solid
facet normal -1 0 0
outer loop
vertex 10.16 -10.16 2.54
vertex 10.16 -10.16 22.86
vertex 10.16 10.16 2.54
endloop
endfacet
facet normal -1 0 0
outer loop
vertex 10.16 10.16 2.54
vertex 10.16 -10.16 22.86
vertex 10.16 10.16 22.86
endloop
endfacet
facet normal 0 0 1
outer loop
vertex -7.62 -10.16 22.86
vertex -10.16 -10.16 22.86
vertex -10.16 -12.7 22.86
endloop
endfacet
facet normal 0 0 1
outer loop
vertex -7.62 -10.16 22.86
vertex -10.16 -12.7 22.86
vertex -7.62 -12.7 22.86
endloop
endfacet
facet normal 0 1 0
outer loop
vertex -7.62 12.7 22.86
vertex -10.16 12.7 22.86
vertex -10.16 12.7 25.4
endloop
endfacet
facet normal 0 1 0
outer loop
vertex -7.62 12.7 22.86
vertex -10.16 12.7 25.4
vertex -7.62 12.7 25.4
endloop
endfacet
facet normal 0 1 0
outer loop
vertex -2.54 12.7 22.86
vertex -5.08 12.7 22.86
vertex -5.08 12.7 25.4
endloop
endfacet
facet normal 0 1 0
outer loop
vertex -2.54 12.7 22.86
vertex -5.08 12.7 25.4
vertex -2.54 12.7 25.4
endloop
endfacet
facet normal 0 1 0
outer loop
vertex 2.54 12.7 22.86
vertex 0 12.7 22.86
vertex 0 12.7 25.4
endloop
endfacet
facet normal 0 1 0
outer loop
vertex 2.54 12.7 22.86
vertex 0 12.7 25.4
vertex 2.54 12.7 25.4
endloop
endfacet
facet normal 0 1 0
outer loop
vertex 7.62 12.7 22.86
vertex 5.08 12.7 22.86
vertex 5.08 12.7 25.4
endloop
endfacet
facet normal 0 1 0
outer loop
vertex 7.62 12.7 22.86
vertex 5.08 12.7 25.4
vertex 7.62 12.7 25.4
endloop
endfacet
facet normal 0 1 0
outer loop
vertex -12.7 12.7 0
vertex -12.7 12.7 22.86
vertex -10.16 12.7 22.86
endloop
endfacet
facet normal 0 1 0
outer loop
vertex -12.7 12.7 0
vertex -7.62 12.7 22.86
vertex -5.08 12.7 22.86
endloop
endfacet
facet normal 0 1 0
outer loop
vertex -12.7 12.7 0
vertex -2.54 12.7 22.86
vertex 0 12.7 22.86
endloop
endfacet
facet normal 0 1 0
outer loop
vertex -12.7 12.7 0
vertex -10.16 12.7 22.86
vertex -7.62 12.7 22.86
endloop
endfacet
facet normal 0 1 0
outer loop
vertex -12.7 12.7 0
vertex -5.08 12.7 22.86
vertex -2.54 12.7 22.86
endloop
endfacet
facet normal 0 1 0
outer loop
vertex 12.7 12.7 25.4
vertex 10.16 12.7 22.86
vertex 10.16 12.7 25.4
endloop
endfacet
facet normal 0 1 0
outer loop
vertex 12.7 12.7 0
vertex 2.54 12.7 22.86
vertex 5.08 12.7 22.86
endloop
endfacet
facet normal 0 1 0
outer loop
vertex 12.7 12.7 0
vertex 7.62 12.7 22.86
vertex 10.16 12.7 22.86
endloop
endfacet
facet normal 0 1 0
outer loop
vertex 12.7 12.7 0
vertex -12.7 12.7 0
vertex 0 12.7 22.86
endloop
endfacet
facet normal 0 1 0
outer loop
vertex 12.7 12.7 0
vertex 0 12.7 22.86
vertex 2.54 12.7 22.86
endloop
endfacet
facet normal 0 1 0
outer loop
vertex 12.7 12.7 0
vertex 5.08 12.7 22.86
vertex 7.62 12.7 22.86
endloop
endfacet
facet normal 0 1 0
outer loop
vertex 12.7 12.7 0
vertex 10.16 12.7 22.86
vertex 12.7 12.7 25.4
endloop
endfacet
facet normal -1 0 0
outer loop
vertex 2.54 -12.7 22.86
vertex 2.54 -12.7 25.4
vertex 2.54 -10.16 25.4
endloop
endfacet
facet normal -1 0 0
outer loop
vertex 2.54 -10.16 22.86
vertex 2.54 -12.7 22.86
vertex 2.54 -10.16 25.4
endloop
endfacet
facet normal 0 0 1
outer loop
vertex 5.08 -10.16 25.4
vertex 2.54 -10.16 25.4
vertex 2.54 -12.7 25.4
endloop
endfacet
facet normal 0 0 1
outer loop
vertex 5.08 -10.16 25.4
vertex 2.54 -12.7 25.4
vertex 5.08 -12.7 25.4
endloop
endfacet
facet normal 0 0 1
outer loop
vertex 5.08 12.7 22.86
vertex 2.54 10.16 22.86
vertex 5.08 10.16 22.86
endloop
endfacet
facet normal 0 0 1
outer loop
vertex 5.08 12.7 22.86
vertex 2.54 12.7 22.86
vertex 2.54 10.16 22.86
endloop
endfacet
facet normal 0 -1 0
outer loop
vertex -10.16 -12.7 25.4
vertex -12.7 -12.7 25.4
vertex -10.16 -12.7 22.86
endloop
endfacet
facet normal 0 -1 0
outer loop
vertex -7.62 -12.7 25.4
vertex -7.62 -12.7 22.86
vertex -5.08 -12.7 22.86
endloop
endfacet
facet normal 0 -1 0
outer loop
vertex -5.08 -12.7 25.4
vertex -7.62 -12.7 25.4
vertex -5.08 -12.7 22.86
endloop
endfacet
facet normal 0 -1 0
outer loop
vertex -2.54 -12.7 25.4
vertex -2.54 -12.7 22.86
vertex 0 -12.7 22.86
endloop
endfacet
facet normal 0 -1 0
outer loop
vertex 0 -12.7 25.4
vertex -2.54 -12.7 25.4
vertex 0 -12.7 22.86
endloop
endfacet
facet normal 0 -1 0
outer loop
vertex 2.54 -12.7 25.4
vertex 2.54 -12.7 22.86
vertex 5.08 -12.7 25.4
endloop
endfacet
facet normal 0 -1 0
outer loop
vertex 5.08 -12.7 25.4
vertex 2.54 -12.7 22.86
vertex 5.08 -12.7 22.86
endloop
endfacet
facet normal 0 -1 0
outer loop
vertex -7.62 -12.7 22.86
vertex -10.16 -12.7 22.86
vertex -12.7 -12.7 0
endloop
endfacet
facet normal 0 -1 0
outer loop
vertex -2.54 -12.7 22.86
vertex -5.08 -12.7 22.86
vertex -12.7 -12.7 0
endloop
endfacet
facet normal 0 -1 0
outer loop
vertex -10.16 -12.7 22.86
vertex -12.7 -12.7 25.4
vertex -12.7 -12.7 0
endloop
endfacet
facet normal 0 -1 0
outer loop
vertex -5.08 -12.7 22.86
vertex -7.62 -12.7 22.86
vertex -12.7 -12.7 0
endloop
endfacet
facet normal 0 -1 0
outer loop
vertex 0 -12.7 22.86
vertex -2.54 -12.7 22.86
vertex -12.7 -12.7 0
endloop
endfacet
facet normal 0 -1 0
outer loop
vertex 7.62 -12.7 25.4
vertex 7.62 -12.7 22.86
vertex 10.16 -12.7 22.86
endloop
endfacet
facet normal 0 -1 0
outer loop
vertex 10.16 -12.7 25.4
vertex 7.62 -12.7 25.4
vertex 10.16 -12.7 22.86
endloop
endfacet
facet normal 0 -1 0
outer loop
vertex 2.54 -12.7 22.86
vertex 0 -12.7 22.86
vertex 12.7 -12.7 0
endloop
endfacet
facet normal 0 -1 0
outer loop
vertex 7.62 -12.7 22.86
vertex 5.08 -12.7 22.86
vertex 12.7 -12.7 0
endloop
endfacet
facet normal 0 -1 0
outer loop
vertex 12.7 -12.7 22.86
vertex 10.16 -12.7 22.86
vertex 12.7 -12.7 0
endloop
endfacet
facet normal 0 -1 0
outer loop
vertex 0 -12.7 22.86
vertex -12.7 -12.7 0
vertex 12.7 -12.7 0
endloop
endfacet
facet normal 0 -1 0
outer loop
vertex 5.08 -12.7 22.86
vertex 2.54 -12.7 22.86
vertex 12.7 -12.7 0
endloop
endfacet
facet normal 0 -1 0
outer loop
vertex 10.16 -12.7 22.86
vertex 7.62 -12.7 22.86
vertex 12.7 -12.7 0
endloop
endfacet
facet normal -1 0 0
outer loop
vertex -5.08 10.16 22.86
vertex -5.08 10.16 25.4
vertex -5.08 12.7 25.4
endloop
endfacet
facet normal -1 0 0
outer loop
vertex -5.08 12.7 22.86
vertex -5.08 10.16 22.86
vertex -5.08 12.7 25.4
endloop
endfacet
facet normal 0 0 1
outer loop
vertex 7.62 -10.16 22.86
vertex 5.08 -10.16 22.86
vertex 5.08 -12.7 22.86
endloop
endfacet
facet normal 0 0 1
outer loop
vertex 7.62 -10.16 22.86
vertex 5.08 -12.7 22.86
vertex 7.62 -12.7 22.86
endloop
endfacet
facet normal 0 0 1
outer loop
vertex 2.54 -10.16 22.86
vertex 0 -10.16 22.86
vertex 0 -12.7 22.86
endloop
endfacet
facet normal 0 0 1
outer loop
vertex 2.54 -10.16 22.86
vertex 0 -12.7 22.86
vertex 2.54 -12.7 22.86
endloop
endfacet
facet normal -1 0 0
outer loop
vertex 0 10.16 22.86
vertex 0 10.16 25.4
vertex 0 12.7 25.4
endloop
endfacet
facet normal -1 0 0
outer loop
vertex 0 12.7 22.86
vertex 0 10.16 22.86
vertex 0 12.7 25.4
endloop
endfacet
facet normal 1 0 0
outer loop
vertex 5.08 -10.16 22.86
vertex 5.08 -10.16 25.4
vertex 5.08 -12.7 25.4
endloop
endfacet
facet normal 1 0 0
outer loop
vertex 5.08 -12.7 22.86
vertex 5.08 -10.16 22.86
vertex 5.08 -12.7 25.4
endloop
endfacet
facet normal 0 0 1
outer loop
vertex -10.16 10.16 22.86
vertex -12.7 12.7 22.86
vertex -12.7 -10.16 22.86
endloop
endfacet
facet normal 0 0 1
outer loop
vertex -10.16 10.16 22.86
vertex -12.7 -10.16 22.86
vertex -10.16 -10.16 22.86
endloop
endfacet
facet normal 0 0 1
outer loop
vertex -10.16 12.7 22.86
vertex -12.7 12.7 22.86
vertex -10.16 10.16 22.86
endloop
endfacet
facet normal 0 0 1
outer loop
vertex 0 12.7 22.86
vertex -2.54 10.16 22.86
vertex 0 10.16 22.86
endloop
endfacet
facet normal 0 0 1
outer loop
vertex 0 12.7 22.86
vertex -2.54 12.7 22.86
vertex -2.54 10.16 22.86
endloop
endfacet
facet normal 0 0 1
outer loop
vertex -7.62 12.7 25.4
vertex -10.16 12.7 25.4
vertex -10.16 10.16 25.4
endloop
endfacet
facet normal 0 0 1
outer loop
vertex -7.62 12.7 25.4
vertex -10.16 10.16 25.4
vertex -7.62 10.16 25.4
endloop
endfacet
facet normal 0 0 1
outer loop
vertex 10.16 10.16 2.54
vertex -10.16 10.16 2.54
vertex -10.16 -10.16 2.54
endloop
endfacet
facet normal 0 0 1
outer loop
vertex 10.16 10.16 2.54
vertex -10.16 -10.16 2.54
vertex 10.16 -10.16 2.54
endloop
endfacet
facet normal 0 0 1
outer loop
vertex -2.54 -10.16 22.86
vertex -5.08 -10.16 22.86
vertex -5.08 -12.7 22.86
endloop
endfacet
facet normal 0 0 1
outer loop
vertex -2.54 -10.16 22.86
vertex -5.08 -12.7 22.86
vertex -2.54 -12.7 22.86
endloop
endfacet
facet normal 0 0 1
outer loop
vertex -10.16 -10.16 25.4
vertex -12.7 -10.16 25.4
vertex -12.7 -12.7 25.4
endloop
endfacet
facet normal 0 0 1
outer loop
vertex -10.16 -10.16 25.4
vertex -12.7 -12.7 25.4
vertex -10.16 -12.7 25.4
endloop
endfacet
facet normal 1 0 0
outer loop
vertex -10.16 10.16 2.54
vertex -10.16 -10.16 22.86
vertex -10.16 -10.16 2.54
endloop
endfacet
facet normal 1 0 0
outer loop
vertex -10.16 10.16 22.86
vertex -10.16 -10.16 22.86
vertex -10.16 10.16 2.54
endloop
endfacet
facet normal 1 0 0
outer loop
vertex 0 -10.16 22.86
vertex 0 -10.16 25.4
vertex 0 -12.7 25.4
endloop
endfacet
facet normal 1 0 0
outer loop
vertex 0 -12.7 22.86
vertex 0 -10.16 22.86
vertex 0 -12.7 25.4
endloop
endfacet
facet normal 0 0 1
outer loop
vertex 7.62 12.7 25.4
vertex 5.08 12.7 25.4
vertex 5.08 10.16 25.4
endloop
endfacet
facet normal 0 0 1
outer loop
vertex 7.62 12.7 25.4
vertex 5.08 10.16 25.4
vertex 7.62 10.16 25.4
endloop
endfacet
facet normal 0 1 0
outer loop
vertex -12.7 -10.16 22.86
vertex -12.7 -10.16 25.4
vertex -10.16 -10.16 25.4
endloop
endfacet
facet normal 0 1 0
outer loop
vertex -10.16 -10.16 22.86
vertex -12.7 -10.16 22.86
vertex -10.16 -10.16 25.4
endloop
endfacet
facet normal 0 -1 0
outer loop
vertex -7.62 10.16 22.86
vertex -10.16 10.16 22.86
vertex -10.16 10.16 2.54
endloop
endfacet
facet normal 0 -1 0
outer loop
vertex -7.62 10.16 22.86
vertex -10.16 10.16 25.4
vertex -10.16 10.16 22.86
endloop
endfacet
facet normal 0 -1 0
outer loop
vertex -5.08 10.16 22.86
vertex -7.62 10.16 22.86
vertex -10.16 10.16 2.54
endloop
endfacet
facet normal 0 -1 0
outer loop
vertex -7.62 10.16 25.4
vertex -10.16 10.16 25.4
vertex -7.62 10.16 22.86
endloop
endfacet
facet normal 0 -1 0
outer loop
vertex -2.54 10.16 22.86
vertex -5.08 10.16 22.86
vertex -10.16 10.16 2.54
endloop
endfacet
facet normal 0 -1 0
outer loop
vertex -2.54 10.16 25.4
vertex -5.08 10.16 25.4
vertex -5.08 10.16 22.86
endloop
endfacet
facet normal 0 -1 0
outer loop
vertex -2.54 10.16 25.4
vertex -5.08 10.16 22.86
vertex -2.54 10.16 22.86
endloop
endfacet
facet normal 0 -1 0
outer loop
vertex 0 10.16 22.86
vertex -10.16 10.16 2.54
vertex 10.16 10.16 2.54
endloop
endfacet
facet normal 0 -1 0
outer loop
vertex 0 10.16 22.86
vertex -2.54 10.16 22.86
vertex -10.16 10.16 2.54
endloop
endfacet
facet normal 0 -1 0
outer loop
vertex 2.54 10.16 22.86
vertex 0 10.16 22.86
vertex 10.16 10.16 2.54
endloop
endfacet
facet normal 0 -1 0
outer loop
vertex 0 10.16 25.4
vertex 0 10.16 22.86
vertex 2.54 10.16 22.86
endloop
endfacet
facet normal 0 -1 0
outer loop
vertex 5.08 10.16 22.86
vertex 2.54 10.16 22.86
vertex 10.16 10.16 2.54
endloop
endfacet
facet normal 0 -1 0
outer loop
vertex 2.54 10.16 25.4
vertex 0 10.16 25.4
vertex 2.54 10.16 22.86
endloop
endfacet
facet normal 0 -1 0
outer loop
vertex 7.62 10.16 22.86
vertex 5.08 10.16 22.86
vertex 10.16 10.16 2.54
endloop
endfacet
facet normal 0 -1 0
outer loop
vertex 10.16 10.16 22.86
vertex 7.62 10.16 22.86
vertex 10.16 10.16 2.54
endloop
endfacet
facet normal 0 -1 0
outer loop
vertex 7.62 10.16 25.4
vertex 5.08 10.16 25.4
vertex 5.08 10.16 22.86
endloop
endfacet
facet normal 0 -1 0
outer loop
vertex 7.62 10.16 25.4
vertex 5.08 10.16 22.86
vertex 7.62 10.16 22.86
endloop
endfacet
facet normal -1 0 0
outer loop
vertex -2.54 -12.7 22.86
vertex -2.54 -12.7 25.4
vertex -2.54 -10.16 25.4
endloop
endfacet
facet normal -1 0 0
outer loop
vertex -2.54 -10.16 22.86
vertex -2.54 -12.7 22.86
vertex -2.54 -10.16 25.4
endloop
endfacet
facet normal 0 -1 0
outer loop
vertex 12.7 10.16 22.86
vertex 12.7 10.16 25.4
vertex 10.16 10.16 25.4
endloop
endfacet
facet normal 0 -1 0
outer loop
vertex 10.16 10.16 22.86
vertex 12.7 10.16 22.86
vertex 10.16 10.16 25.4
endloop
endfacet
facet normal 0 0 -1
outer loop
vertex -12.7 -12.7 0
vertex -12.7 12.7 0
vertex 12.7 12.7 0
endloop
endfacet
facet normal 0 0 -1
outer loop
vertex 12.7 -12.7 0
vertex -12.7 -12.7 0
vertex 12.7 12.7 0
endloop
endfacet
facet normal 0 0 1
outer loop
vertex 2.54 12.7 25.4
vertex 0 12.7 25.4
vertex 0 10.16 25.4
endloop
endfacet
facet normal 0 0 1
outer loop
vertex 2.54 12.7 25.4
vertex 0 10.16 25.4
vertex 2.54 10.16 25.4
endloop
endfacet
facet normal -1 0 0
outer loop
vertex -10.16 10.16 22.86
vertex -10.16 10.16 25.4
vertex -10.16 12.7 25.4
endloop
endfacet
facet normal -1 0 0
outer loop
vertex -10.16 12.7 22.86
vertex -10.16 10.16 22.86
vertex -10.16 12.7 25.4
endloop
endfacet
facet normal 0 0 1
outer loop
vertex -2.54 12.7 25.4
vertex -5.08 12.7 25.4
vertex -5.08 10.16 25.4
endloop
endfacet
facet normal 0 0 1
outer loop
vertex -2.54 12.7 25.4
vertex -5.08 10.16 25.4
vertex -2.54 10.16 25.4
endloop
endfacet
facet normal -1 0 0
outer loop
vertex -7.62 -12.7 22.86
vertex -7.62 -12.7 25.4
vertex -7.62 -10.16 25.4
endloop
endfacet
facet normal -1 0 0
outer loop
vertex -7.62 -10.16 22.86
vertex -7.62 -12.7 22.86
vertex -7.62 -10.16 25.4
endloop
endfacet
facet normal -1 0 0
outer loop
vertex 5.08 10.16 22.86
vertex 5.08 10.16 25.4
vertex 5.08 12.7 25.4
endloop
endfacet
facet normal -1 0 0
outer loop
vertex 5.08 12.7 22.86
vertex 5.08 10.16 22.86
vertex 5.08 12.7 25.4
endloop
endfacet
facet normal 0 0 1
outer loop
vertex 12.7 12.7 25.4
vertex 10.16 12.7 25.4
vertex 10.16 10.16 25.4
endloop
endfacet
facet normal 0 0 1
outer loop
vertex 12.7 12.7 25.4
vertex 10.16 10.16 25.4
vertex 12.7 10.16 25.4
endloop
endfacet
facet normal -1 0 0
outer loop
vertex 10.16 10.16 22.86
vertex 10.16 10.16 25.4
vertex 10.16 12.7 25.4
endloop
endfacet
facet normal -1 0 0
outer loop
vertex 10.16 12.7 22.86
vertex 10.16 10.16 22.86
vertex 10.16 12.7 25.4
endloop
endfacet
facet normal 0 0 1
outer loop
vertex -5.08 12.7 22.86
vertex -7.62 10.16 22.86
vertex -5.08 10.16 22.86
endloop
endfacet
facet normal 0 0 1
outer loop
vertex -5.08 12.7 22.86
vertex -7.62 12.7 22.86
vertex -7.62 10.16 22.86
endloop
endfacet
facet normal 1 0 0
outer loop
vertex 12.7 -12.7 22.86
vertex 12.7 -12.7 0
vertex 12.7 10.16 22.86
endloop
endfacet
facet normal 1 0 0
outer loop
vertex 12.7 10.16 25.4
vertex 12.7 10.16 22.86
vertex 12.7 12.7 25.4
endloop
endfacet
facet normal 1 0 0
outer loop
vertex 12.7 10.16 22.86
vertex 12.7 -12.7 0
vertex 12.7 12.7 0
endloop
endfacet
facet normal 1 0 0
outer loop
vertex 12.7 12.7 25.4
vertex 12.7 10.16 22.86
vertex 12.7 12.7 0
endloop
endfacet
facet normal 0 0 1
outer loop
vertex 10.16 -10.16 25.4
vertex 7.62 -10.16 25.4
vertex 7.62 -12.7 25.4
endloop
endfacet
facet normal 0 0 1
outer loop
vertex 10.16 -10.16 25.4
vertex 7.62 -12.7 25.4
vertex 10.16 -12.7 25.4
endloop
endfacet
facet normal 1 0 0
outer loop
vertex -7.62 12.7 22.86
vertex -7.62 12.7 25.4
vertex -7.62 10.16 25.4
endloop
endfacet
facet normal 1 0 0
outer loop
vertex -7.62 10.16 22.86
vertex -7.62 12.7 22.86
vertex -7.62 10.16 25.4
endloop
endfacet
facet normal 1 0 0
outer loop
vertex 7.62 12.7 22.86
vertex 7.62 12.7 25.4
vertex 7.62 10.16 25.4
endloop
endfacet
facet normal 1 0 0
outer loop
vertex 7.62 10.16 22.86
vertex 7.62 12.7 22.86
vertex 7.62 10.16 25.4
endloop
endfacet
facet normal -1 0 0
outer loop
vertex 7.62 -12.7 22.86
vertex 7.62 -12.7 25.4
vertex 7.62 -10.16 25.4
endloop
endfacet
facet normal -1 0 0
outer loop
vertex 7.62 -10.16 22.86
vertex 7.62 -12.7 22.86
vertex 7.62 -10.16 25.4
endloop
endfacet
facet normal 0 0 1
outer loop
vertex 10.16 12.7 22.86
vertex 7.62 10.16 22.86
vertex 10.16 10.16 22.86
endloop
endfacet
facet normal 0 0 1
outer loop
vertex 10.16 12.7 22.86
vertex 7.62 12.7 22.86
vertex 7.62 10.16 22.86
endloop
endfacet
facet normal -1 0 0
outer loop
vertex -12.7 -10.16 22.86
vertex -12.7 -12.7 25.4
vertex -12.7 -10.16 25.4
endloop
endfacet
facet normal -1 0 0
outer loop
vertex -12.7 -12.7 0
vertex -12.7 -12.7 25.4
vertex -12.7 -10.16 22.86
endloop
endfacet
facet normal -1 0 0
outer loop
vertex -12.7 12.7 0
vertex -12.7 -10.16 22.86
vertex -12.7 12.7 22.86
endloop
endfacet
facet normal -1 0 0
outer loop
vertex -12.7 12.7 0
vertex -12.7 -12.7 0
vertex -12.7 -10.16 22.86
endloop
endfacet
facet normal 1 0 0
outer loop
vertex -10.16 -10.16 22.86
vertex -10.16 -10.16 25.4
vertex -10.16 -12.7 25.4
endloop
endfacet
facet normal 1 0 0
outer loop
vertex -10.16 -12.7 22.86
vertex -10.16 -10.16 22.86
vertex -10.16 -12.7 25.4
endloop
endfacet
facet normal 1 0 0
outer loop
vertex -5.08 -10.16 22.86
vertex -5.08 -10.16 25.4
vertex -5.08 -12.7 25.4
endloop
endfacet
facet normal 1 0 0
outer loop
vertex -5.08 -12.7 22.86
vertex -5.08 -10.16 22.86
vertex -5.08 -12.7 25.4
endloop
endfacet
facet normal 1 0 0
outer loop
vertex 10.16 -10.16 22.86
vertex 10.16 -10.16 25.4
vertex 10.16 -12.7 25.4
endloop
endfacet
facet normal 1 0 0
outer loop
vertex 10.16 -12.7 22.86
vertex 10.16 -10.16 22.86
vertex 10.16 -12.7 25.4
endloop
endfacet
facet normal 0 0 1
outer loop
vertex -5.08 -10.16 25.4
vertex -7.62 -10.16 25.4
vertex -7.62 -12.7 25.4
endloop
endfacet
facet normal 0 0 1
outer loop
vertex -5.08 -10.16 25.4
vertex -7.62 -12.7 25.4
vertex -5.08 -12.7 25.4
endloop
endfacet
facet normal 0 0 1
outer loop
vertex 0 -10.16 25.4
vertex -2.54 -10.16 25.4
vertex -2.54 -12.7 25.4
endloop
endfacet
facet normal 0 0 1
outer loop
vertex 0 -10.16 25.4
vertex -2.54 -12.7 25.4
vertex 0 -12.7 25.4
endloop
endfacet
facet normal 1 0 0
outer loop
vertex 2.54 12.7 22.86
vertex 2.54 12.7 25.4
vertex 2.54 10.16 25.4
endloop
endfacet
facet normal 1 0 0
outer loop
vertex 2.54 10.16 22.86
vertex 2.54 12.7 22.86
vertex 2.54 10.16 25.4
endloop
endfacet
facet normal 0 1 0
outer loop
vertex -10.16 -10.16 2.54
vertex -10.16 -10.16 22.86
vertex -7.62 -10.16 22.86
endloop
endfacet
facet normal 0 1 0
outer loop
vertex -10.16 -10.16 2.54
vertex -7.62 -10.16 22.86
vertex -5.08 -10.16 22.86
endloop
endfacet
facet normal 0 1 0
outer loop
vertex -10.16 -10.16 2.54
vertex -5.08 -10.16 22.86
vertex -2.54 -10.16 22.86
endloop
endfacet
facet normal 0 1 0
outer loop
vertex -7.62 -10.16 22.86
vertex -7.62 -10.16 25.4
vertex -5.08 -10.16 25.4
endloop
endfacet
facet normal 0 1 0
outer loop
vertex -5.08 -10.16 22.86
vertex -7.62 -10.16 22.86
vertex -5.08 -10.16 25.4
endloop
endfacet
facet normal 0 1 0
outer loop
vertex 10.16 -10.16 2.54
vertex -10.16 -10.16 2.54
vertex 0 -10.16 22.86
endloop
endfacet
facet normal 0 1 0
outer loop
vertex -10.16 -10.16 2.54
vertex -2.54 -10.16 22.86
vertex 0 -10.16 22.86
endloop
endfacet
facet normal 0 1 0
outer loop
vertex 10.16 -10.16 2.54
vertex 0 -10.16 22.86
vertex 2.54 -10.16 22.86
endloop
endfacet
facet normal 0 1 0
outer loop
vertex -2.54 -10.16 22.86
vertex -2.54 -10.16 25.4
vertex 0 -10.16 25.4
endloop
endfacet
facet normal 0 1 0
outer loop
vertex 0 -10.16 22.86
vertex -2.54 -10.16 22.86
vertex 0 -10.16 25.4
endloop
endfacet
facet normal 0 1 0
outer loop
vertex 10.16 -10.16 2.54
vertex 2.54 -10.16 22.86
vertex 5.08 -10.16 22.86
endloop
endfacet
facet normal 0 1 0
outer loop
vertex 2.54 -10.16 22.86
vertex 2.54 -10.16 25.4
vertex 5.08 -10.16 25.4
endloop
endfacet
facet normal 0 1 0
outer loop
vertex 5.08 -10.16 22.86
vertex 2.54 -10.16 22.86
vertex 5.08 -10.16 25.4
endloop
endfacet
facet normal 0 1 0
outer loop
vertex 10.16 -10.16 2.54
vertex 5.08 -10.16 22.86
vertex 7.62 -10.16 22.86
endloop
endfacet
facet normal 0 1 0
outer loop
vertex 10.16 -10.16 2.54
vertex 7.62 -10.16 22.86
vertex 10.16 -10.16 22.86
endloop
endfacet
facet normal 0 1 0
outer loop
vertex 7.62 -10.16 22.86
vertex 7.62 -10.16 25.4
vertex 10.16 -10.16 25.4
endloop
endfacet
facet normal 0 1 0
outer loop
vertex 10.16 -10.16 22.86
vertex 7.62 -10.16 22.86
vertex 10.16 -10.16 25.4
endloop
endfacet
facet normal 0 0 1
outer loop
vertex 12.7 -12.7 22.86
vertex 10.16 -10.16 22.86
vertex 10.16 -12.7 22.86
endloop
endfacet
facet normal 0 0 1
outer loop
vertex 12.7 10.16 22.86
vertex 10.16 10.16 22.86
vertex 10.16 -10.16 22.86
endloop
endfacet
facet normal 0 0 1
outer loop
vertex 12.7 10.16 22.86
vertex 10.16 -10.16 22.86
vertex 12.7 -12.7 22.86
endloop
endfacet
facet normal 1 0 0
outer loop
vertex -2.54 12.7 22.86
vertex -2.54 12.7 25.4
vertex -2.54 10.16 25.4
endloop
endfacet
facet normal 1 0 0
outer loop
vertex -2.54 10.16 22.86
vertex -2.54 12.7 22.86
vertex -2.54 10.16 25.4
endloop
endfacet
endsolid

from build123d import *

# Parameters (mm, degrees)
F0_W     = 25.4
F0_H     = 25.4
F1_DEPTH = 25.4
F3_DEPTH = 2.54
F4_W     = 20.32
F4_H     = 20.32
F5_DEPTH = 20.32


with BuildPart() as f1:
    # F0 (on Top) → F1 (new body)
    with BuildSketch(Plane.XY):
        Rectangle(F0_W, F0_H)
    extrude(amount=F1_DEPTH)

    # F2 (on face) → F3 (cut)
    with BuildSketch(Plane.XY.offset(25.4)):
        Polygon((12.7, -10.16), (12.7, 10.16), (10.16, 10.16), (10.16, 12.7), (7.62, 12.7), (7.62, 10.16), (5.08, 10.16), (5.08, 12.7), (2.54, 12.7), (2.54, 10.16), (0, 10.16), (0, 12.7), (-2.54, 12.7), (-2.54, 10.16), (-5.08, 10.16), (-5.08, 12.7), (-7.62, 12.7), (-7.62, 10.16), (-10.16, 10.16), (-10.16, 12.7), (-12.7, 12.7), (-12.7, 10.16), (-12.7, -10.16), (-10.16, -10.16), (-10.16, -12.7), (-7.62, -12.7), (-7.62, -10.16), (-5.08, -10.16), (-5.08, -12.7), (-2.54, -12.7), (-2.54, -10.16), (0, -10.16), (0, -12.7), (2.54, -12.7), (2.54, -10.16), (5.08, -10.16), (5.08, -12.7), (7.62, -12.7), (7.62, -10.16), (10.16, -10.16), (10.16, -12.7), (12.7, -12.7), align=None)
    extrude(amount=-F3_DEPTH, mode=Mode.SUBTRACT)

    # F4 (on face) → F5 (cut)
    with BuildSketch(Plane.XY.offset(22.86)):
        Rectangle(F4_W, F4_H)
    extrude(amount=-F5_DEPTH, mode=Mode.SUBTRACT)


solid = f1.part
